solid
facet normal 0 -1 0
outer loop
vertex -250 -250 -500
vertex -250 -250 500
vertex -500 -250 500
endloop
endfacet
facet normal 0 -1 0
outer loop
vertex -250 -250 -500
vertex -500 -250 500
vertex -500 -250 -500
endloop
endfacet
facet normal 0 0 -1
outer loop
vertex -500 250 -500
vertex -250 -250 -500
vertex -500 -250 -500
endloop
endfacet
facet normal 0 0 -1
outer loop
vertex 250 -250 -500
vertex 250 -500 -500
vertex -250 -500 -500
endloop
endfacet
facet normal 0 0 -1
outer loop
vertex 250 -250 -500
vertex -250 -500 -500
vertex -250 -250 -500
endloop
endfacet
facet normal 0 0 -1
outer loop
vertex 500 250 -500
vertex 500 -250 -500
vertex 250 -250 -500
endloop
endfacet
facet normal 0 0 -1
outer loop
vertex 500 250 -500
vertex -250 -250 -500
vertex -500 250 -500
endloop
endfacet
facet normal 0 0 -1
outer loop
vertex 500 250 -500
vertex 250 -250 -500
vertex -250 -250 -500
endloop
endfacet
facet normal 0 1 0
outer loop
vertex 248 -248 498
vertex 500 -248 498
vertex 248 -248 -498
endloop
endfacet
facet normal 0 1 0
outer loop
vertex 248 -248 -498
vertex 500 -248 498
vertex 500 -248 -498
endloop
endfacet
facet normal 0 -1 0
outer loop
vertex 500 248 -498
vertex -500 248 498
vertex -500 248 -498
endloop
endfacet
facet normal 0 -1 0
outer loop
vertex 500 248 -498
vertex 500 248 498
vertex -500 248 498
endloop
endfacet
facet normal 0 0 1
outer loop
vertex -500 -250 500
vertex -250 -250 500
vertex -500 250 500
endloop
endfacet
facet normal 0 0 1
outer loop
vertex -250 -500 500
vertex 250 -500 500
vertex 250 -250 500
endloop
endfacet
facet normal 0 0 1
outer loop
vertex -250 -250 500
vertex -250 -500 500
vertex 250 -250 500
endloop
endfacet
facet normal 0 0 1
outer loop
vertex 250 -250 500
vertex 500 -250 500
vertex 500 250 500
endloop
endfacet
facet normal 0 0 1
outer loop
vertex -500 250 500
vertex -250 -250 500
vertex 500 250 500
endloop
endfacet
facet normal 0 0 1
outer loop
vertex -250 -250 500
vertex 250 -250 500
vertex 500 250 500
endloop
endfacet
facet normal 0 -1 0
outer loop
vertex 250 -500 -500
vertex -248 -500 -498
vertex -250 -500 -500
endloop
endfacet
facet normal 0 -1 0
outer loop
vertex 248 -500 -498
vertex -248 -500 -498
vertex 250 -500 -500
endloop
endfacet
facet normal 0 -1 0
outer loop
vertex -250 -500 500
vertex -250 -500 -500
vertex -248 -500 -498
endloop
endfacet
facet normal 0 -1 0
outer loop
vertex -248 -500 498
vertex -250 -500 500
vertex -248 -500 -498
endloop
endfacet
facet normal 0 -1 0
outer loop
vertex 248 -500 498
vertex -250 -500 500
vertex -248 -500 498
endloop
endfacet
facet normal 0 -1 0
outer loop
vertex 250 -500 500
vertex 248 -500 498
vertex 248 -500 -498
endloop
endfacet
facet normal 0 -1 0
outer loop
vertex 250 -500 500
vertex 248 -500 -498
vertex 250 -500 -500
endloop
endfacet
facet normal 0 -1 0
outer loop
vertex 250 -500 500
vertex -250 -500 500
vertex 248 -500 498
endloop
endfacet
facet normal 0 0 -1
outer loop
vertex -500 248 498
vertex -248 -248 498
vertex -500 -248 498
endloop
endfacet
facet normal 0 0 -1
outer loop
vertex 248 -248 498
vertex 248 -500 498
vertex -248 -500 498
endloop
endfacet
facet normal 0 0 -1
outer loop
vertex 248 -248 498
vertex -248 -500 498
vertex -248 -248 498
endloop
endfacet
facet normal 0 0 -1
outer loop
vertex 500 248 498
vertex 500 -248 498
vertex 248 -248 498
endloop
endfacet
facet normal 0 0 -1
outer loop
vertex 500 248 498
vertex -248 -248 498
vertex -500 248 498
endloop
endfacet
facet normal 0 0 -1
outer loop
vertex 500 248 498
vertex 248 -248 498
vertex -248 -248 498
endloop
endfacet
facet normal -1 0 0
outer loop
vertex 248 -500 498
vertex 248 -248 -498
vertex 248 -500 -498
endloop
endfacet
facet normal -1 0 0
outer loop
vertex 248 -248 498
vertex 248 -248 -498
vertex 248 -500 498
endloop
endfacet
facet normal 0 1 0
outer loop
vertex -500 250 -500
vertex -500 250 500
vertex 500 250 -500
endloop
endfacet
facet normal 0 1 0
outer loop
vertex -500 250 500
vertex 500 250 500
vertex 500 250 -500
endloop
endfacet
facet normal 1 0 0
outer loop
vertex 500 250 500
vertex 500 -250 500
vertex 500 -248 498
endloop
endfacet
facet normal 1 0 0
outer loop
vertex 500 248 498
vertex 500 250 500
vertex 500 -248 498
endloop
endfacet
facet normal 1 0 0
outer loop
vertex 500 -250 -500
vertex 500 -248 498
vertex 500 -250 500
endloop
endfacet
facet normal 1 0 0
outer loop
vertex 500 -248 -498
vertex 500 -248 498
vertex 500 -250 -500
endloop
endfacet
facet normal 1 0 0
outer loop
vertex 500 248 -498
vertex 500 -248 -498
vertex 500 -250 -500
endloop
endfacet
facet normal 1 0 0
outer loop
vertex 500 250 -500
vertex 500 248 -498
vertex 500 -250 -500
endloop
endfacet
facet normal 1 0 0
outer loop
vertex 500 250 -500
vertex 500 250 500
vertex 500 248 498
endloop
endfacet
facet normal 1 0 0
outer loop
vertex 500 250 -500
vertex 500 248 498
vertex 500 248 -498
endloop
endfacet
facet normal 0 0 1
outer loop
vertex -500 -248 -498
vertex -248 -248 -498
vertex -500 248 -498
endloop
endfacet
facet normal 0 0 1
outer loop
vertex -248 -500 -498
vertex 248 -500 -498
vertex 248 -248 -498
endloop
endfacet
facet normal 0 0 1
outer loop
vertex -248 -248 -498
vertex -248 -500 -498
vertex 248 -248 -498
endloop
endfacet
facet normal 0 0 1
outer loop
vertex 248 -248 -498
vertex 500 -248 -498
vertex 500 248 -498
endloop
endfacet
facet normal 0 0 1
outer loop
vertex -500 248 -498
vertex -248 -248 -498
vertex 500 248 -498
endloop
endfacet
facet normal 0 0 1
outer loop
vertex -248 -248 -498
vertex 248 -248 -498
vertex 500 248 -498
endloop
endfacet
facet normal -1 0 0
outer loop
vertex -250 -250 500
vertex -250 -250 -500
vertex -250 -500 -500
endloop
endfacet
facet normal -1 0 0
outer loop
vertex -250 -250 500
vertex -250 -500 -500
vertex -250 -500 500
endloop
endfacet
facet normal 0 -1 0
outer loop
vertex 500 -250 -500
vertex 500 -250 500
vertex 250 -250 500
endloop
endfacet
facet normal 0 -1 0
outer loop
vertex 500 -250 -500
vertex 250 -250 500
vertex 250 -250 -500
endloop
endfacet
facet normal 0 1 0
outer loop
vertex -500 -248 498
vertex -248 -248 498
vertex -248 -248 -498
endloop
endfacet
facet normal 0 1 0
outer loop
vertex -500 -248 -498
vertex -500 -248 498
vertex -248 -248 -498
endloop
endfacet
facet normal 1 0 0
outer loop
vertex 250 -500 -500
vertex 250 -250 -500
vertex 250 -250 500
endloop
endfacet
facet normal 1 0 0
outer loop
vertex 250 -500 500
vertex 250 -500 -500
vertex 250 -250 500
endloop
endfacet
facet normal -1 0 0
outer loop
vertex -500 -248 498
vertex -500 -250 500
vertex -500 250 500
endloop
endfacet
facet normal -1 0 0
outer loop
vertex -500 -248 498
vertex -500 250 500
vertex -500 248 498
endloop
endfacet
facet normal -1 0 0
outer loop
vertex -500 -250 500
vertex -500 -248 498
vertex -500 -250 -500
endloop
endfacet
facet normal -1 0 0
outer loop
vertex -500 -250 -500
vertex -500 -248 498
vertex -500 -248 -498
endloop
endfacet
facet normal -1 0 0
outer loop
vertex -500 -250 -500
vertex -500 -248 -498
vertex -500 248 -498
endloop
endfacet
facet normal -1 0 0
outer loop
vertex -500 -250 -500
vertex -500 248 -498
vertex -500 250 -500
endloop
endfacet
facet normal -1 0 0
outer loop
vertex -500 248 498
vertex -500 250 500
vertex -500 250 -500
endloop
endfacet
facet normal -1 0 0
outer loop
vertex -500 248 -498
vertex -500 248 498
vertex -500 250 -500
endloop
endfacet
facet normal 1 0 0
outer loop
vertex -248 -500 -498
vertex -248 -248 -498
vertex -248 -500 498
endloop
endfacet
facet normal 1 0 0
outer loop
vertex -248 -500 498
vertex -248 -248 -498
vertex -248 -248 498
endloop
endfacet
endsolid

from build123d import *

# Parameters (mm, degrees)
SKETCH1_W           = 1000
SKETCH1_H           = 500
SKETCH1_W_2         = 996
SKETCH1_H_2         = 496
EXTRUDE_THIN1_DEPTH = 500
SKETCH2_W           = 500
SKETCH2_H           = 1000
SKETCH2_W_2         = 496
SKETCH2_H_2         = 996
EXTRUDE_THIN2_DEPTH = 250
CUT_EXTRUDE1_REACH  = 1032.776
SKETCH3_W           = 496
SKETCH3_H           = 996


with BuildPart() as part:
    # Sketch1 → Extrude-Thin1 (new, symmetric)
    with BuildSketch(Plane(origin=(0, 0, 0), x_dir=(0, 0, -1), z_dir=(1, 0, 0))):
        Rectangle(SKETCH1_W, SKETCH1_H)
        Rectangle(SKETCH1_W_2, SKETCH1_H_2, mode=Mode.SUBTRACT)
    extrude(amount=EXTRUDE_THIN1_DEPTH, both=True)

    # Sketch2 → Extrude-Thin2 (add)
    with BuildSketch(Plane.XZ.offset(250)):
        Rectangle(SKETCH2_W, SKETCH2_H)
        Rectangle(SKETCH2_W_2, SKETCH2_H_2, mode=Mode.SUBTRACT)
    extrude(amount=EXTRUDE_THIN2_DEPTH)

    # Sketch3 → Cut-Extrude1 (cut, up to next)
    with BuildSketch(Plane.XZ.offset(500), mode=Mode.PRIVATE) as cut_extrude1_sk1:
        Rectangle(SKETCH3_W, SKETCH3_H)
    cut_extrude1_tool1 = extrude(cut_extrude1_sk1.sketch, amount=-CUT_EXTRUDE1_REACH, mode=Mode.PRIVATE) & part.part
    add(cut_extrude1_tool1.solids().sort_by_distance((0, -500, 0))[0], mode=Mode.SUBTRACT)


solid = part.part
